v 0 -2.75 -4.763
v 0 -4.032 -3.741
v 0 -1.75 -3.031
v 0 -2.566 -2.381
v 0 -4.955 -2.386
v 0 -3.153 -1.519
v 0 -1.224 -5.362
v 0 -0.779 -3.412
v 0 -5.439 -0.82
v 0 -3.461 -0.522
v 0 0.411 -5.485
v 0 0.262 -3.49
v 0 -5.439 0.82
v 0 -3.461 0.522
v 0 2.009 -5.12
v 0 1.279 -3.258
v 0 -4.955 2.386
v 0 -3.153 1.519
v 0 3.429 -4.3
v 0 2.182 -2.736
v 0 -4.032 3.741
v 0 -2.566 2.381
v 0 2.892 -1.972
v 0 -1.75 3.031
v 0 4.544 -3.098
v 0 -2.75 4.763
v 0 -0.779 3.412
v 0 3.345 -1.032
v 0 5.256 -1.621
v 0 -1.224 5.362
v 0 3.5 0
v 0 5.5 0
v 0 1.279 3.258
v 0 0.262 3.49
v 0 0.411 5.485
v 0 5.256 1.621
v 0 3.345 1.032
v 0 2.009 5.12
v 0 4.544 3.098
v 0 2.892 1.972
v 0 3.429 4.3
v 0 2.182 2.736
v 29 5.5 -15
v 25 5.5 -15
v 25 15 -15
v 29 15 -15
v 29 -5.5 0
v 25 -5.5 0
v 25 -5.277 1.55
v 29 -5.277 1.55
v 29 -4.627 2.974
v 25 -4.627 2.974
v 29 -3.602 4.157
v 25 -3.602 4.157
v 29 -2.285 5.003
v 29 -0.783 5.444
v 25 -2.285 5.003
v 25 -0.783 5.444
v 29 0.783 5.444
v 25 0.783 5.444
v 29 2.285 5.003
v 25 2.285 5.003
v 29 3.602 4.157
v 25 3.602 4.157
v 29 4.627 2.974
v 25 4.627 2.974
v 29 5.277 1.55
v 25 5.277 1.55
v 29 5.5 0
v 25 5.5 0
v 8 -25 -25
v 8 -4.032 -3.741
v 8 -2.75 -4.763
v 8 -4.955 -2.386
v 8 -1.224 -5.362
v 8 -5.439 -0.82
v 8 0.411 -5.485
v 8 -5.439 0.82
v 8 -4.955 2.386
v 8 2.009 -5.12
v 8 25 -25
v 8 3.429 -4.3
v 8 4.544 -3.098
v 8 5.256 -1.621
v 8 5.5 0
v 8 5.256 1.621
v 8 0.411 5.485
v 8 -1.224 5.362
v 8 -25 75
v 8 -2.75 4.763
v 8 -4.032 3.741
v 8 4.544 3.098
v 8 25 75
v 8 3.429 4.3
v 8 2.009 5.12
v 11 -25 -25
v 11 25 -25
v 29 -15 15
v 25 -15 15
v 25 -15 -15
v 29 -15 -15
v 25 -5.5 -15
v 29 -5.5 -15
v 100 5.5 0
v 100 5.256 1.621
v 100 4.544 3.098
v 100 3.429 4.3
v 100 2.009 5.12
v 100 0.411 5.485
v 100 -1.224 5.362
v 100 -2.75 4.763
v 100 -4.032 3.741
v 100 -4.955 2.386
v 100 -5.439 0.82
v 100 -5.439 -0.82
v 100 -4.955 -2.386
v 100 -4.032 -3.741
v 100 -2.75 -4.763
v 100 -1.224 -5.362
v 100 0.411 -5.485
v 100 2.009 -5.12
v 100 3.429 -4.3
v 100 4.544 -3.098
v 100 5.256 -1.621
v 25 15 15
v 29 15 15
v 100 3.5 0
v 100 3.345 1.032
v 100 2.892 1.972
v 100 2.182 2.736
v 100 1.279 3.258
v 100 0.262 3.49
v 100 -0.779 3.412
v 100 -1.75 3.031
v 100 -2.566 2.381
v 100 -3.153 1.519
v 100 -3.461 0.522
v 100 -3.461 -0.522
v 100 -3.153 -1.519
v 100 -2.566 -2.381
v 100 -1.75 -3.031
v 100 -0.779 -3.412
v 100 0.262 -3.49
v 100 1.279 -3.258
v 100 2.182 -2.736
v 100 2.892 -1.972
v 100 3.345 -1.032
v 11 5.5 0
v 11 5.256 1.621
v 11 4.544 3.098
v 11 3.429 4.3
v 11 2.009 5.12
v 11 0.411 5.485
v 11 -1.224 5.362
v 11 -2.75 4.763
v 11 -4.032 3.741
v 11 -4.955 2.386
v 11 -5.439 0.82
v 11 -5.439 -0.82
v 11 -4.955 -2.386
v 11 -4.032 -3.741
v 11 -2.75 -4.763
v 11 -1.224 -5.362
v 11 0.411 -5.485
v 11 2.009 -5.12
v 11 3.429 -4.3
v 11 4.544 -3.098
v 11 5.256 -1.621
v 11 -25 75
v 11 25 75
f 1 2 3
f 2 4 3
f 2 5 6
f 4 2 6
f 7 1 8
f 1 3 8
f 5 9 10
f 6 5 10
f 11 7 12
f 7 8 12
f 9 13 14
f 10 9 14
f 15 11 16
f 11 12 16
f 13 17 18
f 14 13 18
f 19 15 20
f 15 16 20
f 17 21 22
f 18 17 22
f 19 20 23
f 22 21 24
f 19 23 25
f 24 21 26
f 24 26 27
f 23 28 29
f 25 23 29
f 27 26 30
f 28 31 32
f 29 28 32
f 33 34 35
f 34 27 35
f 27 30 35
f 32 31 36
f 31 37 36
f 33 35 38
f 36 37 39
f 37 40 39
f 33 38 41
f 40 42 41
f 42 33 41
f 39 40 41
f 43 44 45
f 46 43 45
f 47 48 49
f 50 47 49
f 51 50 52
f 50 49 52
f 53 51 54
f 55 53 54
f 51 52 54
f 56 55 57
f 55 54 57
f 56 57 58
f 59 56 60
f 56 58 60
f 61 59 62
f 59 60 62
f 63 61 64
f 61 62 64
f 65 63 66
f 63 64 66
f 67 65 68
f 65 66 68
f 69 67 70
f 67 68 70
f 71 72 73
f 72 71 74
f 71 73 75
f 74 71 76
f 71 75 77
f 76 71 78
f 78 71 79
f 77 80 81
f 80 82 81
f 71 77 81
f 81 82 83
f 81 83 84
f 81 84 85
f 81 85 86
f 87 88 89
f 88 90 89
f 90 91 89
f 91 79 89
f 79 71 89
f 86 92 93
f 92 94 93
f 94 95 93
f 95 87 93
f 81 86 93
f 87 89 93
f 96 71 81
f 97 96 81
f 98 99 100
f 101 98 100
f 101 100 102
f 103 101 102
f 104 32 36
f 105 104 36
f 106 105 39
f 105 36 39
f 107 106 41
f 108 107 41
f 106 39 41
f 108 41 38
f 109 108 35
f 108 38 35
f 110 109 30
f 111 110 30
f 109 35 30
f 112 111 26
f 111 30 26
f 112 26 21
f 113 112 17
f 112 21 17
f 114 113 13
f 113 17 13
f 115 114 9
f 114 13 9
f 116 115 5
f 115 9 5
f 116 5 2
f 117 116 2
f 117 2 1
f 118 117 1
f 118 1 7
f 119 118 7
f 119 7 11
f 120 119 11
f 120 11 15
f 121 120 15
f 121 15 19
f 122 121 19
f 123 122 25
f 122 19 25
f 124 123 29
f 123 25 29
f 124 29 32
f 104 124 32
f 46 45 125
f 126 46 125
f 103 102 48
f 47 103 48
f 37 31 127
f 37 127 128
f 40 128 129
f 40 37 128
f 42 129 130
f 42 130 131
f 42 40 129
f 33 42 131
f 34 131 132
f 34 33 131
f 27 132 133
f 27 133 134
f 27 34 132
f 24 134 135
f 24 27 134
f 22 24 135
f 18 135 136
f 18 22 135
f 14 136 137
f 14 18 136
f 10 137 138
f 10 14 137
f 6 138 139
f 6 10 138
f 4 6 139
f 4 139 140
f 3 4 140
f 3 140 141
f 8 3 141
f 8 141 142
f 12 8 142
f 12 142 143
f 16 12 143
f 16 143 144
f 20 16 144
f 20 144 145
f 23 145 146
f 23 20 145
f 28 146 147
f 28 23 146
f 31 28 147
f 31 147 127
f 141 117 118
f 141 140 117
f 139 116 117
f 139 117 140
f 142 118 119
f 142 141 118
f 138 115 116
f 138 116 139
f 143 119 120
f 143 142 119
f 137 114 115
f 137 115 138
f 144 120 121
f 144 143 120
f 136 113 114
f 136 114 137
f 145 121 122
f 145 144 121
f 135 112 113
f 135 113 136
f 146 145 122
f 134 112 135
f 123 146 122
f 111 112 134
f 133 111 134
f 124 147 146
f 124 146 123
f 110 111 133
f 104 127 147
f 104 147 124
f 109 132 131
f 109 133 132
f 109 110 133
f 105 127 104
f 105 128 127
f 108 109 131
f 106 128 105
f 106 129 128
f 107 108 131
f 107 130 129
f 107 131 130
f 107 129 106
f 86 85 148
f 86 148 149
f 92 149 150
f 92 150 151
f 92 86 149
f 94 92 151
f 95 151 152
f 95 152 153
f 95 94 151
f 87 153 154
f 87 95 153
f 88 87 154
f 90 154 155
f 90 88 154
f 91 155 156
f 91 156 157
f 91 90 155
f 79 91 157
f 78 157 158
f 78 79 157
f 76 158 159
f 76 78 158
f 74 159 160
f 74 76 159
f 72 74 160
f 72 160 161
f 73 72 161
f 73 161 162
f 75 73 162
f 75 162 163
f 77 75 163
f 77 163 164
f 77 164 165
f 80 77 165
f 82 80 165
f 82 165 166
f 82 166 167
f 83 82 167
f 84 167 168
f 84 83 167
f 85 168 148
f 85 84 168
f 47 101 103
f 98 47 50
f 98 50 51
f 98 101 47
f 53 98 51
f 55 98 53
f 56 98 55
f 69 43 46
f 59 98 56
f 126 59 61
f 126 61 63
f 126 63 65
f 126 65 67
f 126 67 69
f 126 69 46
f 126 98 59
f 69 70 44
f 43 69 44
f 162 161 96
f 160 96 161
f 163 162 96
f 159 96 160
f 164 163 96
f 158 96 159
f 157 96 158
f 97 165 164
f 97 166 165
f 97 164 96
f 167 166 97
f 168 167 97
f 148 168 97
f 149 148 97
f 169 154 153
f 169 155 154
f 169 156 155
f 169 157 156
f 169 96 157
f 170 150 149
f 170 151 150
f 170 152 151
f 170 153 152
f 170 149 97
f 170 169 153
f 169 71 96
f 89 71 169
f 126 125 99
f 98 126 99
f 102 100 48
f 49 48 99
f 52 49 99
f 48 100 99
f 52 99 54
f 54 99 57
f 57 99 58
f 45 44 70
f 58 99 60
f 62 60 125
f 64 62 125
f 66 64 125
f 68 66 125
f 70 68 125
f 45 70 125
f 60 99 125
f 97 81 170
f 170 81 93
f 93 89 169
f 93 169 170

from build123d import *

# Parameters (mm, degrees)
F0_R     = 5.5
F0_R_2   = 3.5
F1_DEPTH = 100
F4_W     = 50
F4_H     = 100
F4_R     = 5.5
F5_DEPTH = 3
F7_DEPTH = 4


with BuildPart() as f1:
    # F0 (on Right) → F1 (new body)
    with BuildSketch(Plane.YZ):
        Circle(F0_R)
        Circle(F0_R_2, mode=Mode.SUBTRACT)
    extrude(amount=F1_DEPTH)


with BuildPart() as f5:
    # F4 (on offset) → F5 (new body)
    with BuildSketch(Plane.YZ.offset(8)):
        with Locations((0, 25)):
            Rectangle(F4_W, F4_H)
        Circle(F4_R, mode=Mode.SUBTRACT)
    extrude(amount=F5_DEPTH)


with BuildPart() as f7:
    # F6 (on offset) → F7 (new body)
    with BuildSketch(Plane.YZ.offset(25)):
        with BuildLine():
            ThreePointArc((-5.5, 0), (0, 5.5), (5.5, 0))
            Line((5.5, 0), (5.5, -15))
            Line((5.5, -15), (15, -15))
            Line((15, -15), (15, 15))
            Line((15, 15), (-15, 15))
            Line((-15, 15), (-15, -15))
            Line((-15, -15), (-5.5, -15))
            Line((-5.5, -15), (-5.5, 0))
        make_face()
    extrude(amount=F7_DEPTH)


solid = Compound([f1.part, f5.part, f7.part])
